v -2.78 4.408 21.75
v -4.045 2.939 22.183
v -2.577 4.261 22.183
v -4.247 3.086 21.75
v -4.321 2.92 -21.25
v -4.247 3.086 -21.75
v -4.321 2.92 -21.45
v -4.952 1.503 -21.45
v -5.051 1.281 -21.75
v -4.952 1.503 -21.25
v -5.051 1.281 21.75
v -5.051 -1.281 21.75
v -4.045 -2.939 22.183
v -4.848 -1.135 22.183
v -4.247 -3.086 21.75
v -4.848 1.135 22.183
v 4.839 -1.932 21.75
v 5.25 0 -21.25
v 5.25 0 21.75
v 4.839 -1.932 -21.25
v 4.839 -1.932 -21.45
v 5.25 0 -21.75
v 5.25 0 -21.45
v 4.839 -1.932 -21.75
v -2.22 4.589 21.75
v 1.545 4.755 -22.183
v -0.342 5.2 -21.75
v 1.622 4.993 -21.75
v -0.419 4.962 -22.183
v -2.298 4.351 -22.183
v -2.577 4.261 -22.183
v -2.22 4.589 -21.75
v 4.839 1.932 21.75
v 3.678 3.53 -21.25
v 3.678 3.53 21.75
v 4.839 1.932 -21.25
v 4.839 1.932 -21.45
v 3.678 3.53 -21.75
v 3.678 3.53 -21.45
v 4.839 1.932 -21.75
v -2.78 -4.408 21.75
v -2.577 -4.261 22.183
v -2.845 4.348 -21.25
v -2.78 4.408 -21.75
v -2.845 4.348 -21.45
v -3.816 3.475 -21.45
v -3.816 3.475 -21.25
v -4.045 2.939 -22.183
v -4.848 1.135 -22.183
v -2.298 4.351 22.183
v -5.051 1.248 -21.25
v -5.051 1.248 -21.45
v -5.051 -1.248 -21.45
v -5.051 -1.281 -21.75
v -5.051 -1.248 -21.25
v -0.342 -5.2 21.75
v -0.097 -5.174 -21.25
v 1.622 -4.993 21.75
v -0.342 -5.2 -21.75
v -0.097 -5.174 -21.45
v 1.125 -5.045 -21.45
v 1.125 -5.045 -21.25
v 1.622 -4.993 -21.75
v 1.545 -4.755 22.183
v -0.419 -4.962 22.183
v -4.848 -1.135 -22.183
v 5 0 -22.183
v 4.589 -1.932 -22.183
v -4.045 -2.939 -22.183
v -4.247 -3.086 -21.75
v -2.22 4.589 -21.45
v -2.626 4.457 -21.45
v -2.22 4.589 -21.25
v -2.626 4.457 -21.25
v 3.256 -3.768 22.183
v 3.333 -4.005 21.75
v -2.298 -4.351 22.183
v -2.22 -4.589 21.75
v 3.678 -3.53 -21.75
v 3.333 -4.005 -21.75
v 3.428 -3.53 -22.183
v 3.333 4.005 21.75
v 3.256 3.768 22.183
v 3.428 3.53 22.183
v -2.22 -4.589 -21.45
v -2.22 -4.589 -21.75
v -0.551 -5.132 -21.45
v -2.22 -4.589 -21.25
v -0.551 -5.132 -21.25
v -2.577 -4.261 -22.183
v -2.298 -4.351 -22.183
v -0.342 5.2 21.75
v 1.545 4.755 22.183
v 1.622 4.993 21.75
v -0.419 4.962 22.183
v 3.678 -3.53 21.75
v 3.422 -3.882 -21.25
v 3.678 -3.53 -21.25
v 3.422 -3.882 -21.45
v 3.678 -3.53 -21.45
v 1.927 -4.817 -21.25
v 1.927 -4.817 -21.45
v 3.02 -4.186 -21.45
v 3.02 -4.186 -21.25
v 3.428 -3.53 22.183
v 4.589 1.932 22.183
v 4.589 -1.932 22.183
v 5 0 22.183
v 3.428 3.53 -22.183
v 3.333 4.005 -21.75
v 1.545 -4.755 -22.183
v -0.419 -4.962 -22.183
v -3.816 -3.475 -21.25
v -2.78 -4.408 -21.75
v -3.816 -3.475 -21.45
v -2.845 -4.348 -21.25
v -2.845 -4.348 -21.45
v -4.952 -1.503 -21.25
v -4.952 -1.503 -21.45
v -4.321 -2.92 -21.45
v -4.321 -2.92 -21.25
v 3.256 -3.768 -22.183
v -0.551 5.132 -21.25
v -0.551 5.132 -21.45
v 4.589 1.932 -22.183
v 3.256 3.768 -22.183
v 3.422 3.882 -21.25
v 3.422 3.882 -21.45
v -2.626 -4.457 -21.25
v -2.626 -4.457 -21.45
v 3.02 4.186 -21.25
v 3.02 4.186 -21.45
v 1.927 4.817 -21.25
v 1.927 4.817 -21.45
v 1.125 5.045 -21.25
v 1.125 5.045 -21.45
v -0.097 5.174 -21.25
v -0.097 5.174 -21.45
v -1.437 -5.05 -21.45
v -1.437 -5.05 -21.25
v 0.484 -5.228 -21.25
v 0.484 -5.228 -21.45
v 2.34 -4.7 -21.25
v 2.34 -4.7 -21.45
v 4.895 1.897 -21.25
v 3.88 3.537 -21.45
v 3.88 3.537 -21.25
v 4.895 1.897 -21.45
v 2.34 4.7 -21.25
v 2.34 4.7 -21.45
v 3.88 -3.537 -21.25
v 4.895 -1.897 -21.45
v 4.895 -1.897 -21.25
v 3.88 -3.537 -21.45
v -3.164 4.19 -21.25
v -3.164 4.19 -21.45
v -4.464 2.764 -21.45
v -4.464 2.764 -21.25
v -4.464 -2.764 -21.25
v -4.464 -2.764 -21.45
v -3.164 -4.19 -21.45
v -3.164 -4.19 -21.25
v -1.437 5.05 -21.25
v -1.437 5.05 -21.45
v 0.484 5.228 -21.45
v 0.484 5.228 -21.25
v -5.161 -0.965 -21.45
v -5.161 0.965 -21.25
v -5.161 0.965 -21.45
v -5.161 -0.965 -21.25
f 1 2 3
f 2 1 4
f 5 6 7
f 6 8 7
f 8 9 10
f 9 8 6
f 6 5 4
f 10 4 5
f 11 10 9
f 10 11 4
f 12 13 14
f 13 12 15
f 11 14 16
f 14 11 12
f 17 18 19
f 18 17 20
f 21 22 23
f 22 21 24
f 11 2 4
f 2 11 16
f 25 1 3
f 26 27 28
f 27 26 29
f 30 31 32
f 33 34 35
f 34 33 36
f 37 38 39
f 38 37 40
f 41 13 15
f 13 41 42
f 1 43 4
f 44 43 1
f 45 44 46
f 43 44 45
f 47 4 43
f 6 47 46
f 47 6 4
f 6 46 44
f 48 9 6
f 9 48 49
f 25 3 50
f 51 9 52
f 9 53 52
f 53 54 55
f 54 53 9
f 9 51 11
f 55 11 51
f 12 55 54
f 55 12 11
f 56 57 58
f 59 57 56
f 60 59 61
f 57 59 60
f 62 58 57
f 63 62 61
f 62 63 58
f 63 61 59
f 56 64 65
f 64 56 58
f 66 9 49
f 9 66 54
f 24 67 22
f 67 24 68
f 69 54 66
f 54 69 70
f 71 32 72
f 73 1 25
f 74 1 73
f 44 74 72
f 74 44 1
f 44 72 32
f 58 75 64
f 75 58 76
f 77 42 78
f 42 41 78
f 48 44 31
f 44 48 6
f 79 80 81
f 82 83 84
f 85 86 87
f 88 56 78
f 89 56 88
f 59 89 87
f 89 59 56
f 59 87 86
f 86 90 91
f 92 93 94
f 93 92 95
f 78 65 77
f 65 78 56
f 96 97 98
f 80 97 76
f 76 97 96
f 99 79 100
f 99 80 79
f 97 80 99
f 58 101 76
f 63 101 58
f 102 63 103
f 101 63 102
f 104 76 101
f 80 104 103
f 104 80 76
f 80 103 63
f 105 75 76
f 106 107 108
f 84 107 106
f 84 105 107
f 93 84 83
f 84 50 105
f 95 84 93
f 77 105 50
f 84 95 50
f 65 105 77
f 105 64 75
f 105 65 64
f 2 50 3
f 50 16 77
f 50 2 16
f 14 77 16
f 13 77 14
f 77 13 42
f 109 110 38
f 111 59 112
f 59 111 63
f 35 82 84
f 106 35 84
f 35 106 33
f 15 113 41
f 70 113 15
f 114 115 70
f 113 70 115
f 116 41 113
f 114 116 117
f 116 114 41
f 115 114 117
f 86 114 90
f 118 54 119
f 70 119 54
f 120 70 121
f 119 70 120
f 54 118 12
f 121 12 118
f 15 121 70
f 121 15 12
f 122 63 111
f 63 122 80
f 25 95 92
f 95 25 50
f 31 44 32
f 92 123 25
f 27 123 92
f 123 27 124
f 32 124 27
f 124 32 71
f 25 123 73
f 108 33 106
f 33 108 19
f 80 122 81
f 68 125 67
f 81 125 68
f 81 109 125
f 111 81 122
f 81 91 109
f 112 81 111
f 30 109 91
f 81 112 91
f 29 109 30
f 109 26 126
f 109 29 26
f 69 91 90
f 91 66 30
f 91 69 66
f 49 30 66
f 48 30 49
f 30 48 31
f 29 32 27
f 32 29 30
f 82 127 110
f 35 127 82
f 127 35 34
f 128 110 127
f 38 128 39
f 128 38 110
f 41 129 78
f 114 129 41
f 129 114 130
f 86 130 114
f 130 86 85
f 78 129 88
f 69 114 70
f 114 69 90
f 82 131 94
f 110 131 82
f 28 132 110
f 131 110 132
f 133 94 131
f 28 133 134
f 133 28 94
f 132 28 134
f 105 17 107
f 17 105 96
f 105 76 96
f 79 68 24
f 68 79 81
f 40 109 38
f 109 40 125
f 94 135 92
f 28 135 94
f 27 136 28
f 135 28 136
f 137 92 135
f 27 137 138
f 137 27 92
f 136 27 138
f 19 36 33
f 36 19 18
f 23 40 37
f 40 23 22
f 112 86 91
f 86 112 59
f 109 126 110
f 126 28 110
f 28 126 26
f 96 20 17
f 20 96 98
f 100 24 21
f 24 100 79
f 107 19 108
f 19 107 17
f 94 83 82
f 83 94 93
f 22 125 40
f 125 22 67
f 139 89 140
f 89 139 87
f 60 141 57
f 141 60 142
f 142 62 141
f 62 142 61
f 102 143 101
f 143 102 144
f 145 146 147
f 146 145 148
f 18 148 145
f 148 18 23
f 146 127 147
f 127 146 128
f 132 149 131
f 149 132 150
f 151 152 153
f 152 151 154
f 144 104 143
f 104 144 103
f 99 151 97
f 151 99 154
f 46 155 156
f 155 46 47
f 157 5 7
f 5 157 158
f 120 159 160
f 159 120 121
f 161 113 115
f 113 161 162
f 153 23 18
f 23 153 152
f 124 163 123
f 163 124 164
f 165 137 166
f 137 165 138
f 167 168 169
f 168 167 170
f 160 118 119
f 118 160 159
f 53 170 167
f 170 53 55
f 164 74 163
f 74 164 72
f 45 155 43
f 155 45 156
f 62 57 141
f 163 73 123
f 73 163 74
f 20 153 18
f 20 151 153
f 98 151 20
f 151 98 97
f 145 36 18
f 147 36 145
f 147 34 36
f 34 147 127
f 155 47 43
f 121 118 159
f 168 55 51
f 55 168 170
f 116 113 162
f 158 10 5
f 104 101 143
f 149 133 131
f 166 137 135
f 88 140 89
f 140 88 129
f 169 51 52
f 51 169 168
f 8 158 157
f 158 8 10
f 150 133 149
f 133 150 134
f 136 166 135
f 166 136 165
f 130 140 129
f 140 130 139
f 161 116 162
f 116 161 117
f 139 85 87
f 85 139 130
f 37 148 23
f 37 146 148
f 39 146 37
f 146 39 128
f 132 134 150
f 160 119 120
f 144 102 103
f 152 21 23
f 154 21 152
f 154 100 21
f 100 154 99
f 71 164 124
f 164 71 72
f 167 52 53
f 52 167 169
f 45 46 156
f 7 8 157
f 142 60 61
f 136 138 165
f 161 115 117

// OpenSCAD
// Parameters
overall_height_mm = 44.5; //[22.25:89:0.1]
outer_diameter_mm = 10.5; //[5.25:21:0.1]
positive_terminal_diameter_mm = 5; //[2.5:10:0.1]
positive_terminal_height_mm = 1; //[0.5:2:0.05]
negative_terminal_diameter_mm = 10.5; //[5.25:21:0.1]
negative_terminal_height_mm = 0.2; //[0.1:0.6:0.05]
body_fillet_radius_mm = 0.5; //[0.25:1:0.05]
terminal_overlap_mm = 0.8; //[0.5:2:0.1]

// Battery - complete geometry
module battery() {
  color("DimGray") {
    // Cylindrical body with filleted edges
    minkowski() {
      cylinder(h=overall_height_mm - 2*body_fillet_radius_mm, 
               r=outer_diameter_mm/2 - body_fillet_radius_mm, center=true);
      sphere(r=body_fillet_radius_mm);
    }
    
    // Positive terminal button
    translate([0, 0, overall_height_mm/2 - positive_terminal_height_mm/2 - terminal_overlap_mm])
      cylinder(h=positive_terminal_height_mm, r=positive_terminal_diameter_mm/2, center=true);
    
    // Negative terminal flat end
    translate([0, 0, -overall_height_mm/2 + negative_terminal_height_mm/2 + terminal_overlap_mm])
      cylinder(h=negative_terminal_height_mm, r=negative_terminal_diameter_mm/2, center=true);
  }
}

// Assembly
module assembly() {
  battery();
}

assembly();
